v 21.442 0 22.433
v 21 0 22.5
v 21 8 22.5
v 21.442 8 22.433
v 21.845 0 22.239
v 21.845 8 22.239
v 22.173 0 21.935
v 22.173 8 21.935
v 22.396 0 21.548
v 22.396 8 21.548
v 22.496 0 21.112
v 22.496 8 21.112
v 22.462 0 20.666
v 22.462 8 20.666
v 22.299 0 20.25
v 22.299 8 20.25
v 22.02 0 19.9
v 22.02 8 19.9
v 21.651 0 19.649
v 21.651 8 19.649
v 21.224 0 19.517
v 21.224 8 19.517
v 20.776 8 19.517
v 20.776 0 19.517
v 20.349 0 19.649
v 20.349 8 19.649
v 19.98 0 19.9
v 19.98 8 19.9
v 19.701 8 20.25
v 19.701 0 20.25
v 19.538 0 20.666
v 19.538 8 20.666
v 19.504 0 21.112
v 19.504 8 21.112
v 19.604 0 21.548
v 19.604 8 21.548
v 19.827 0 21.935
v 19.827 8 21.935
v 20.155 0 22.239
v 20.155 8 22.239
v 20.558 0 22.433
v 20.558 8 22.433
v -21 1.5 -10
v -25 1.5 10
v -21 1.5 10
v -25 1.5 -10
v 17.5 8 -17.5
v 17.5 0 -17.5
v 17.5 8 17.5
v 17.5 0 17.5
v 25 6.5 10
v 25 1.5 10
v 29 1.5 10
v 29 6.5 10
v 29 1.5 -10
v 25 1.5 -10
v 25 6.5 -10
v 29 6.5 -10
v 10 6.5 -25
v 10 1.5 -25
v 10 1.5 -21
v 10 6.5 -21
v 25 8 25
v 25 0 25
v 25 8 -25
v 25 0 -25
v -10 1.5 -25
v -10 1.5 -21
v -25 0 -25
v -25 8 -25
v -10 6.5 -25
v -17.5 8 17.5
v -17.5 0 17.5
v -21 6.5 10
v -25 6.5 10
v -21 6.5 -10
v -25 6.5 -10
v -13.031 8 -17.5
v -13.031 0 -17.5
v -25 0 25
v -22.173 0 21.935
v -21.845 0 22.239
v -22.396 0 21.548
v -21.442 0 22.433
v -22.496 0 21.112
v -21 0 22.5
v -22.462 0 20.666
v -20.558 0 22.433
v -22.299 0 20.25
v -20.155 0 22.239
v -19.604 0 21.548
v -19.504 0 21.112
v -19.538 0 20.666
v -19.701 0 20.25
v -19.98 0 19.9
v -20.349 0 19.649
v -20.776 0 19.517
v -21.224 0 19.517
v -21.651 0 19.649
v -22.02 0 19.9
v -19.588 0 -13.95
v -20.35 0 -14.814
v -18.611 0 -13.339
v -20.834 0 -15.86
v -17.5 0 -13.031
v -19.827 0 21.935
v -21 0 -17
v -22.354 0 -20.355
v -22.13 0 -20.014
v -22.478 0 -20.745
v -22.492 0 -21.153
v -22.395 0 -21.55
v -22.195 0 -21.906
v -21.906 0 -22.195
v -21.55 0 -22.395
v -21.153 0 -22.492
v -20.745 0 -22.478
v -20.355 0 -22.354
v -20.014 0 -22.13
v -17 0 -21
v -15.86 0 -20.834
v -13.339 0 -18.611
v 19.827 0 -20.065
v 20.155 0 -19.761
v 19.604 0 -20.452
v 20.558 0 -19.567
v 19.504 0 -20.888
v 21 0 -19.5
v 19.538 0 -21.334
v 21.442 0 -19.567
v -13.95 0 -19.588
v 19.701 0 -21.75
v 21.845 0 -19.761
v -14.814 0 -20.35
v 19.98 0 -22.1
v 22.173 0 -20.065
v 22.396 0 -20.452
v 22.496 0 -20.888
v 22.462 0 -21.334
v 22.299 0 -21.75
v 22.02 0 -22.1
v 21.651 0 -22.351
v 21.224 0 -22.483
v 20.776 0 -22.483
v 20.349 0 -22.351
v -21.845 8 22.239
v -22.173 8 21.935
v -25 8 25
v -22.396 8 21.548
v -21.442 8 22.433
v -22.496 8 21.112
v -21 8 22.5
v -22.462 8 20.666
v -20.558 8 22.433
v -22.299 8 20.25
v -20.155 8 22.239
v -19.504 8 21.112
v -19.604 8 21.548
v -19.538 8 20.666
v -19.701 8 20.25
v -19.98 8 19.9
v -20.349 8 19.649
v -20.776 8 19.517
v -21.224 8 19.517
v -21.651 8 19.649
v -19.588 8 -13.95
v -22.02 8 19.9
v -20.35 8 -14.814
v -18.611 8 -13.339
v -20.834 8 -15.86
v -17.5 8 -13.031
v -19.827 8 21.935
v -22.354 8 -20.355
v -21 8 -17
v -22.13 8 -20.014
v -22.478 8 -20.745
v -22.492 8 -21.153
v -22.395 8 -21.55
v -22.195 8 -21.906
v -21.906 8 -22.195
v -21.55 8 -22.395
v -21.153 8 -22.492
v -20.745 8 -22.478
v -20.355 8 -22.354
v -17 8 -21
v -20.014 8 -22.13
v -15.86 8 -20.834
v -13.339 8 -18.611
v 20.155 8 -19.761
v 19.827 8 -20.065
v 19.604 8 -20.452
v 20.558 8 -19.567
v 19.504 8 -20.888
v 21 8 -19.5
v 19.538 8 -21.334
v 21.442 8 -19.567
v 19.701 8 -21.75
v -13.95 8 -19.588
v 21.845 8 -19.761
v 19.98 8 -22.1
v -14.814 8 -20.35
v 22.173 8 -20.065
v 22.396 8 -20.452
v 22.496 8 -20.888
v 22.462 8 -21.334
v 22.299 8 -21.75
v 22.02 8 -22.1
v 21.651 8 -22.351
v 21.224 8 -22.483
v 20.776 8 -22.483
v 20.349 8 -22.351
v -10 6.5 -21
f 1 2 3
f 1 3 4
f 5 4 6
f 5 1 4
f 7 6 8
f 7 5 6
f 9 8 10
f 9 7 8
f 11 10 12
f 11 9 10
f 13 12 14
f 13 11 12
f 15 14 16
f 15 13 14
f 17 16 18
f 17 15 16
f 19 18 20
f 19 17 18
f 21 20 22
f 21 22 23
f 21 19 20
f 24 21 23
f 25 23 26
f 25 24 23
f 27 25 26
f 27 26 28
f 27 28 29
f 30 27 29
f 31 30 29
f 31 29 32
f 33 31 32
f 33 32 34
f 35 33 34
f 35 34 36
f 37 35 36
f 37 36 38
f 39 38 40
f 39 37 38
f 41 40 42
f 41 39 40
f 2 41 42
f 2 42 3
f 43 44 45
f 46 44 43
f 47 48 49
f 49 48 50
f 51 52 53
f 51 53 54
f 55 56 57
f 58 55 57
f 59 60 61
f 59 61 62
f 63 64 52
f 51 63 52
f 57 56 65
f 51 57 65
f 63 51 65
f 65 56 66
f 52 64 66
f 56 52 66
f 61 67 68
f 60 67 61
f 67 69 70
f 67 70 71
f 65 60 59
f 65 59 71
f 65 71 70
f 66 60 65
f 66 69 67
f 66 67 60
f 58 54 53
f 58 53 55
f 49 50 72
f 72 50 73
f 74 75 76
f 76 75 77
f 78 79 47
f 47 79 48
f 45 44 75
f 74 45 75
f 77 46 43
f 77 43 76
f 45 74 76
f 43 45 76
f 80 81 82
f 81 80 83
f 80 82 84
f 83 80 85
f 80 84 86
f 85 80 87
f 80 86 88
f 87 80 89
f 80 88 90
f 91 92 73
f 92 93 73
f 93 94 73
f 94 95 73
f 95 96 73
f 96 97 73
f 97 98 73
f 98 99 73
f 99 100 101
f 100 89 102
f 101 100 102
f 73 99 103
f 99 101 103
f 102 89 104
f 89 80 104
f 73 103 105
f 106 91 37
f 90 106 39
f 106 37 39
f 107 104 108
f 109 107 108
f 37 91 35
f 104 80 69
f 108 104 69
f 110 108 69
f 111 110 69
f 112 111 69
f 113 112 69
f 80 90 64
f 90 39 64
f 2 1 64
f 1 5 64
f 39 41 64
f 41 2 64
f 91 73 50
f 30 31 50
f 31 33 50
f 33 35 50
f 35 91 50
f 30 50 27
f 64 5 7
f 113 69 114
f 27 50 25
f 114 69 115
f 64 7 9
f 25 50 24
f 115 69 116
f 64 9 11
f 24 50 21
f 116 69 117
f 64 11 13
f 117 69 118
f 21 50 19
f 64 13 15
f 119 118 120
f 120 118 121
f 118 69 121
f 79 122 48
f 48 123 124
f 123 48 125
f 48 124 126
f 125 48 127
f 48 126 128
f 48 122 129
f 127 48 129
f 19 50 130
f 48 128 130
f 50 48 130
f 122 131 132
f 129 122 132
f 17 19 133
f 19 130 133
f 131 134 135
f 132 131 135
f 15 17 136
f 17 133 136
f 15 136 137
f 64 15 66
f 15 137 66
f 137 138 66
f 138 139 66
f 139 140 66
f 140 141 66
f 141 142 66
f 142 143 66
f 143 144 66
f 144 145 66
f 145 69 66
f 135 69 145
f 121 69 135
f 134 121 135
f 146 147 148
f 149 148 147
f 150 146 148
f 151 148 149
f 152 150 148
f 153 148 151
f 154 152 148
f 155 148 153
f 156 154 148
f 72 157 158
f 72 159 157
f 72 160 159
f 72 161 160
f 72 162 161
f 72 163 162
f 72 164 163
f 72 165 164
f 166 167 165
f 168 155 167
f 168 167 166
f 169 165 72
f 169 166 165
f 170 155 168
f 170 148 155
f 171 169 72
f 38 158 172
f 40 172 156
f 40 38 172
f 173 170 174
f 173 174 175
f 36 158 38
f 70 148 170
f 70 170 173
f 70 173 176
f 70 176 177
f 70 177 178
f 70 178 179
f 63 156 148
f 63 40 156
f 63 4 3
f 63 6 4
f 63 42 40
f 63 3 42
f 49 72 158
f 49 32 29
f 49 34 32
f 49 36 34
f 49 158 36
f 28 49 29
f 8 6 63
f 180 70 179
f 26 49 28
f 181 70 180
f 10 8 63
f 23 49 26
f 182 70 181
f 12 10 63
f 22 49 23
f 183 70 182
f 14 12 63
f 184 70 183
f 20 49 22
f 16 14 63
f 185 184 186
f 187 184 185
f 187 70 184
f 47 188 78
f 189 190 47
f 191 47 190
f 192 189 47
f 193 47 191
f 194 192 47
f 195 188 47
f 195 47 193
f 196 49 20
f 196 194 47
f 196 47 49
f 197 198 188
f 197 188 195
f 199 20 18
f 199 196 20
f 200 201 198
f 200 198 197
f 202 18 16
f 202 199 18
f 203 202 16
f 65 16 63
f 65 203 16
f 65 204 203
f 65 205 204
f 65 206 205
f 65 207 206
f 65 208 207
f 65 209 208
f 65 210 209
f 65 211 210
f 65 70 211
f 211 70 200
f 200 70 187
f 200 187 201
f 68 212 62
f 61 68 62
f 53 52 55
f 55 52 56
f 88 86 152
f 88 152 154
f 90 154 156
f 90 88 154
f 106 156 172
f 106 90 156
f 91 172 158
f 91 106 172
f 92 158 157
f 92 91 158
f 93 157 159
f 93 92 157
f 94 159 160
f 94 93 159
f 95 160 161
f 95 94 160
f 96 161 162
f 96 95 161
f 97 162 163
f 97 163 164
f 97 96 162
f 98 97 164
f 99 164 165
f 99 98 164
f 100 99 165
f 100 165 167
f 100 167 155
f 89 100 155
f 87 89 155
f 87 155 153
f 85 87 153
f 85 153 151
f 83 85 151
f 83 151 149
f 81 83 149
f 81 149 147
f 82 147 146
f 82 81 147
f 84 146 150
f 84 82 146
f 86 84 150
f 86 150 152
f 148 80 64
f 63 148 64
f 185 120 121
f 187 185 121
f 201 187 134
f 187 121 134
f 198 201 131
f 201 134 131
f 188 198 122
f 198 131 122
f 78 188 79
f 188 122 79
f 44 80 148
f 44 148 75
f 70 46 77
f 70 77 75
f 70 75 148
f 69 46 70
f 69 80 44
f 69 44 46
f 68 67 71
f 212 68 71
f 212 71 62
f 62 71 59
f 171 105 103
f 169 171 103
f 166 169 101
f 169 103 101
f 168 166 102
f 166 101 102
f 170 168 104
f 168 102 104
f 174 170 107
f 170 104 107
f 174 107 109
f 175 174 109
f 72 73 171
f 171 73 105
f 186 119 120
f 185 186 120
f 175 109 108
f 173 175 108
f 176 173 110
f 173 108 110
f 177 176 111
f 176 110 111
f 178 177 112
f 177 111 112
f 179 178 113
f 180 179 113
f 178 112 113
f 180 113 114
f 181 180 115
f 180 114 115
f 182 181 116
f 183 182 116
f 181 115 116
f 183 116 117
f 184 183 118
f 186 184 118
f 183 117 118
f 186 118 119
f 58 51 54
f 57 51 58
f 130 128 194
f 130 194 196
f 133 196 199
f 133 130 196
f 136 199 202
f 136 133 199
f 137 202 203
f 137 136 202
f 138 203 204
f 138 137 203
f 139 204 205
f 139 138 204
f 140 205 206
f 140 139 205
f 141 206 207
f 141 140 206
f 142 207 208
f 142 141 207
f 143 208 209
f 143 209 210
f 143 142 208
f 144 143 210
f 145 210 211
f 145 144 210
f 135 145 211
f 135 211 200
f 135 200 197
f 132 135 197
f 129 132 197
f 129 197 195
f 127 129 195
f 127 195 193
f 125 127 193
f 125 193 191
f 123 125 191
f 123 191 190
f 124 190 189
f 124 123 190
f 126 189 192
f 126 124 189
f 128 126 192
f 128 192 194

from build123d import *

# Parameters (mm, degrees)
SKETCH1_W        = 50
SKETCH1_H        = 50
SKETCH1_R        = 1.5
SUPPORT_DEPTH    = 8
NORTH_START      = -25
SKETCH2_W        = 20
SKETCH2_H        = 5
NORTH_CUT_DEPTH  = 4
WEST_START       = -25
SKETCH3_W        = 20
SKETCH3_H        = 5
WEST_CUT_DEPTH   = 4
EAST_START       = 25
SKETCH3_3_W      = 20
SKETCH3_3_H      = 5
EAST_DOWEL_DEPTH = 4


with BuildPart() as part:
    # Sketch1 → Support (new body)
    with BuildSketch(Plane(origin=(0, 0, 0), x_dir=(1, 0, 0), z_dir=(0, 1, 0))):
        Rectangle(SKETCH1_W, SKETCH1_H)
        with Locations(Location((-21, -21, 0), (0, 0, 270))):
            Circle(SKETCH1_R, mode=Mode.SUBTRACT)
        with Locations(Location((21, -21, 0), (0, 0, 270))):
            Circle(SKETCH1_R, mode=Mode.SUBTRACT)
        with BuildLine():
            Line((-13.031373033, 17.5), (17.5, 17.5))
            Line((17.5, 17.5), (17.5, -17.5))
            Line((17.5, -17.5), (-17.5, -17.5))
            Line((-17.5, -17.5), (-17.5, 13.031373033))
            ThreePointArc((-17.5, 13.031373033), (-20, 14.354248689), (-21, 17))
            Line((-21, 17), (-22.130136986, 20.01369863))
            ThreePointArc((-22.130136986, 20.01369863), (-22.060660172, 22.060660172), (-20.01369863, 22.130136986))
            Line((-20.01369863, 22.130136986), (-17, 21))
            ThreePointArc((-17, 21), (-14.354248689, 20), (-13.031373033, 17.5))
        make_face(mode=Mode.SUBTRACT)
        with Locations(Location((21, 21, 0), (0, 0, 270))):
            Circle(SKETCH1_R, mode=Mode.SUBTRACT)
    extrude(amount=SUPPORT_DEPTH)

    # Sketch2 → North Cut (cut)
    with BuildSketch(Plane.XY.offset(NORTH_START)):
        with Locations((0, 4)):
            Rectangle(SKETCH2_W, SKETCH2_H)
    extrude(amount=NORTH_CUT_DEPTH, mode=Mode.SUBTRACT)

    # Sketch3 → West Cut (cut)
    with BuildSketch(Plane(origin=(0, 0, 0), x_dir=(0, 0, -1), z_dir=(1, 0, 0)).offset(WEST_START)):
        with Locations((0, 4)):
            Rectangle(SKETCH3_W, SKETCH3_H)
    extrude(amount=WEST_CUT_DEPTH, mode=Mode.SUBTRACT)

    # Sketch3<3> → East Dowel (add)
    with BuildSketch(Plane(origin=(0, 0, 0), x_dir=(0, 0, -1), z_dir=(1, 0, 0)).offset(EAST_START)):
        with Locations((0, 4)):
            Rectangle(SKETCH3_3_W, SKETCH3_3_H)
    extrude(amount=EAST_DOWEL_DEPTH)


solid = part.part
